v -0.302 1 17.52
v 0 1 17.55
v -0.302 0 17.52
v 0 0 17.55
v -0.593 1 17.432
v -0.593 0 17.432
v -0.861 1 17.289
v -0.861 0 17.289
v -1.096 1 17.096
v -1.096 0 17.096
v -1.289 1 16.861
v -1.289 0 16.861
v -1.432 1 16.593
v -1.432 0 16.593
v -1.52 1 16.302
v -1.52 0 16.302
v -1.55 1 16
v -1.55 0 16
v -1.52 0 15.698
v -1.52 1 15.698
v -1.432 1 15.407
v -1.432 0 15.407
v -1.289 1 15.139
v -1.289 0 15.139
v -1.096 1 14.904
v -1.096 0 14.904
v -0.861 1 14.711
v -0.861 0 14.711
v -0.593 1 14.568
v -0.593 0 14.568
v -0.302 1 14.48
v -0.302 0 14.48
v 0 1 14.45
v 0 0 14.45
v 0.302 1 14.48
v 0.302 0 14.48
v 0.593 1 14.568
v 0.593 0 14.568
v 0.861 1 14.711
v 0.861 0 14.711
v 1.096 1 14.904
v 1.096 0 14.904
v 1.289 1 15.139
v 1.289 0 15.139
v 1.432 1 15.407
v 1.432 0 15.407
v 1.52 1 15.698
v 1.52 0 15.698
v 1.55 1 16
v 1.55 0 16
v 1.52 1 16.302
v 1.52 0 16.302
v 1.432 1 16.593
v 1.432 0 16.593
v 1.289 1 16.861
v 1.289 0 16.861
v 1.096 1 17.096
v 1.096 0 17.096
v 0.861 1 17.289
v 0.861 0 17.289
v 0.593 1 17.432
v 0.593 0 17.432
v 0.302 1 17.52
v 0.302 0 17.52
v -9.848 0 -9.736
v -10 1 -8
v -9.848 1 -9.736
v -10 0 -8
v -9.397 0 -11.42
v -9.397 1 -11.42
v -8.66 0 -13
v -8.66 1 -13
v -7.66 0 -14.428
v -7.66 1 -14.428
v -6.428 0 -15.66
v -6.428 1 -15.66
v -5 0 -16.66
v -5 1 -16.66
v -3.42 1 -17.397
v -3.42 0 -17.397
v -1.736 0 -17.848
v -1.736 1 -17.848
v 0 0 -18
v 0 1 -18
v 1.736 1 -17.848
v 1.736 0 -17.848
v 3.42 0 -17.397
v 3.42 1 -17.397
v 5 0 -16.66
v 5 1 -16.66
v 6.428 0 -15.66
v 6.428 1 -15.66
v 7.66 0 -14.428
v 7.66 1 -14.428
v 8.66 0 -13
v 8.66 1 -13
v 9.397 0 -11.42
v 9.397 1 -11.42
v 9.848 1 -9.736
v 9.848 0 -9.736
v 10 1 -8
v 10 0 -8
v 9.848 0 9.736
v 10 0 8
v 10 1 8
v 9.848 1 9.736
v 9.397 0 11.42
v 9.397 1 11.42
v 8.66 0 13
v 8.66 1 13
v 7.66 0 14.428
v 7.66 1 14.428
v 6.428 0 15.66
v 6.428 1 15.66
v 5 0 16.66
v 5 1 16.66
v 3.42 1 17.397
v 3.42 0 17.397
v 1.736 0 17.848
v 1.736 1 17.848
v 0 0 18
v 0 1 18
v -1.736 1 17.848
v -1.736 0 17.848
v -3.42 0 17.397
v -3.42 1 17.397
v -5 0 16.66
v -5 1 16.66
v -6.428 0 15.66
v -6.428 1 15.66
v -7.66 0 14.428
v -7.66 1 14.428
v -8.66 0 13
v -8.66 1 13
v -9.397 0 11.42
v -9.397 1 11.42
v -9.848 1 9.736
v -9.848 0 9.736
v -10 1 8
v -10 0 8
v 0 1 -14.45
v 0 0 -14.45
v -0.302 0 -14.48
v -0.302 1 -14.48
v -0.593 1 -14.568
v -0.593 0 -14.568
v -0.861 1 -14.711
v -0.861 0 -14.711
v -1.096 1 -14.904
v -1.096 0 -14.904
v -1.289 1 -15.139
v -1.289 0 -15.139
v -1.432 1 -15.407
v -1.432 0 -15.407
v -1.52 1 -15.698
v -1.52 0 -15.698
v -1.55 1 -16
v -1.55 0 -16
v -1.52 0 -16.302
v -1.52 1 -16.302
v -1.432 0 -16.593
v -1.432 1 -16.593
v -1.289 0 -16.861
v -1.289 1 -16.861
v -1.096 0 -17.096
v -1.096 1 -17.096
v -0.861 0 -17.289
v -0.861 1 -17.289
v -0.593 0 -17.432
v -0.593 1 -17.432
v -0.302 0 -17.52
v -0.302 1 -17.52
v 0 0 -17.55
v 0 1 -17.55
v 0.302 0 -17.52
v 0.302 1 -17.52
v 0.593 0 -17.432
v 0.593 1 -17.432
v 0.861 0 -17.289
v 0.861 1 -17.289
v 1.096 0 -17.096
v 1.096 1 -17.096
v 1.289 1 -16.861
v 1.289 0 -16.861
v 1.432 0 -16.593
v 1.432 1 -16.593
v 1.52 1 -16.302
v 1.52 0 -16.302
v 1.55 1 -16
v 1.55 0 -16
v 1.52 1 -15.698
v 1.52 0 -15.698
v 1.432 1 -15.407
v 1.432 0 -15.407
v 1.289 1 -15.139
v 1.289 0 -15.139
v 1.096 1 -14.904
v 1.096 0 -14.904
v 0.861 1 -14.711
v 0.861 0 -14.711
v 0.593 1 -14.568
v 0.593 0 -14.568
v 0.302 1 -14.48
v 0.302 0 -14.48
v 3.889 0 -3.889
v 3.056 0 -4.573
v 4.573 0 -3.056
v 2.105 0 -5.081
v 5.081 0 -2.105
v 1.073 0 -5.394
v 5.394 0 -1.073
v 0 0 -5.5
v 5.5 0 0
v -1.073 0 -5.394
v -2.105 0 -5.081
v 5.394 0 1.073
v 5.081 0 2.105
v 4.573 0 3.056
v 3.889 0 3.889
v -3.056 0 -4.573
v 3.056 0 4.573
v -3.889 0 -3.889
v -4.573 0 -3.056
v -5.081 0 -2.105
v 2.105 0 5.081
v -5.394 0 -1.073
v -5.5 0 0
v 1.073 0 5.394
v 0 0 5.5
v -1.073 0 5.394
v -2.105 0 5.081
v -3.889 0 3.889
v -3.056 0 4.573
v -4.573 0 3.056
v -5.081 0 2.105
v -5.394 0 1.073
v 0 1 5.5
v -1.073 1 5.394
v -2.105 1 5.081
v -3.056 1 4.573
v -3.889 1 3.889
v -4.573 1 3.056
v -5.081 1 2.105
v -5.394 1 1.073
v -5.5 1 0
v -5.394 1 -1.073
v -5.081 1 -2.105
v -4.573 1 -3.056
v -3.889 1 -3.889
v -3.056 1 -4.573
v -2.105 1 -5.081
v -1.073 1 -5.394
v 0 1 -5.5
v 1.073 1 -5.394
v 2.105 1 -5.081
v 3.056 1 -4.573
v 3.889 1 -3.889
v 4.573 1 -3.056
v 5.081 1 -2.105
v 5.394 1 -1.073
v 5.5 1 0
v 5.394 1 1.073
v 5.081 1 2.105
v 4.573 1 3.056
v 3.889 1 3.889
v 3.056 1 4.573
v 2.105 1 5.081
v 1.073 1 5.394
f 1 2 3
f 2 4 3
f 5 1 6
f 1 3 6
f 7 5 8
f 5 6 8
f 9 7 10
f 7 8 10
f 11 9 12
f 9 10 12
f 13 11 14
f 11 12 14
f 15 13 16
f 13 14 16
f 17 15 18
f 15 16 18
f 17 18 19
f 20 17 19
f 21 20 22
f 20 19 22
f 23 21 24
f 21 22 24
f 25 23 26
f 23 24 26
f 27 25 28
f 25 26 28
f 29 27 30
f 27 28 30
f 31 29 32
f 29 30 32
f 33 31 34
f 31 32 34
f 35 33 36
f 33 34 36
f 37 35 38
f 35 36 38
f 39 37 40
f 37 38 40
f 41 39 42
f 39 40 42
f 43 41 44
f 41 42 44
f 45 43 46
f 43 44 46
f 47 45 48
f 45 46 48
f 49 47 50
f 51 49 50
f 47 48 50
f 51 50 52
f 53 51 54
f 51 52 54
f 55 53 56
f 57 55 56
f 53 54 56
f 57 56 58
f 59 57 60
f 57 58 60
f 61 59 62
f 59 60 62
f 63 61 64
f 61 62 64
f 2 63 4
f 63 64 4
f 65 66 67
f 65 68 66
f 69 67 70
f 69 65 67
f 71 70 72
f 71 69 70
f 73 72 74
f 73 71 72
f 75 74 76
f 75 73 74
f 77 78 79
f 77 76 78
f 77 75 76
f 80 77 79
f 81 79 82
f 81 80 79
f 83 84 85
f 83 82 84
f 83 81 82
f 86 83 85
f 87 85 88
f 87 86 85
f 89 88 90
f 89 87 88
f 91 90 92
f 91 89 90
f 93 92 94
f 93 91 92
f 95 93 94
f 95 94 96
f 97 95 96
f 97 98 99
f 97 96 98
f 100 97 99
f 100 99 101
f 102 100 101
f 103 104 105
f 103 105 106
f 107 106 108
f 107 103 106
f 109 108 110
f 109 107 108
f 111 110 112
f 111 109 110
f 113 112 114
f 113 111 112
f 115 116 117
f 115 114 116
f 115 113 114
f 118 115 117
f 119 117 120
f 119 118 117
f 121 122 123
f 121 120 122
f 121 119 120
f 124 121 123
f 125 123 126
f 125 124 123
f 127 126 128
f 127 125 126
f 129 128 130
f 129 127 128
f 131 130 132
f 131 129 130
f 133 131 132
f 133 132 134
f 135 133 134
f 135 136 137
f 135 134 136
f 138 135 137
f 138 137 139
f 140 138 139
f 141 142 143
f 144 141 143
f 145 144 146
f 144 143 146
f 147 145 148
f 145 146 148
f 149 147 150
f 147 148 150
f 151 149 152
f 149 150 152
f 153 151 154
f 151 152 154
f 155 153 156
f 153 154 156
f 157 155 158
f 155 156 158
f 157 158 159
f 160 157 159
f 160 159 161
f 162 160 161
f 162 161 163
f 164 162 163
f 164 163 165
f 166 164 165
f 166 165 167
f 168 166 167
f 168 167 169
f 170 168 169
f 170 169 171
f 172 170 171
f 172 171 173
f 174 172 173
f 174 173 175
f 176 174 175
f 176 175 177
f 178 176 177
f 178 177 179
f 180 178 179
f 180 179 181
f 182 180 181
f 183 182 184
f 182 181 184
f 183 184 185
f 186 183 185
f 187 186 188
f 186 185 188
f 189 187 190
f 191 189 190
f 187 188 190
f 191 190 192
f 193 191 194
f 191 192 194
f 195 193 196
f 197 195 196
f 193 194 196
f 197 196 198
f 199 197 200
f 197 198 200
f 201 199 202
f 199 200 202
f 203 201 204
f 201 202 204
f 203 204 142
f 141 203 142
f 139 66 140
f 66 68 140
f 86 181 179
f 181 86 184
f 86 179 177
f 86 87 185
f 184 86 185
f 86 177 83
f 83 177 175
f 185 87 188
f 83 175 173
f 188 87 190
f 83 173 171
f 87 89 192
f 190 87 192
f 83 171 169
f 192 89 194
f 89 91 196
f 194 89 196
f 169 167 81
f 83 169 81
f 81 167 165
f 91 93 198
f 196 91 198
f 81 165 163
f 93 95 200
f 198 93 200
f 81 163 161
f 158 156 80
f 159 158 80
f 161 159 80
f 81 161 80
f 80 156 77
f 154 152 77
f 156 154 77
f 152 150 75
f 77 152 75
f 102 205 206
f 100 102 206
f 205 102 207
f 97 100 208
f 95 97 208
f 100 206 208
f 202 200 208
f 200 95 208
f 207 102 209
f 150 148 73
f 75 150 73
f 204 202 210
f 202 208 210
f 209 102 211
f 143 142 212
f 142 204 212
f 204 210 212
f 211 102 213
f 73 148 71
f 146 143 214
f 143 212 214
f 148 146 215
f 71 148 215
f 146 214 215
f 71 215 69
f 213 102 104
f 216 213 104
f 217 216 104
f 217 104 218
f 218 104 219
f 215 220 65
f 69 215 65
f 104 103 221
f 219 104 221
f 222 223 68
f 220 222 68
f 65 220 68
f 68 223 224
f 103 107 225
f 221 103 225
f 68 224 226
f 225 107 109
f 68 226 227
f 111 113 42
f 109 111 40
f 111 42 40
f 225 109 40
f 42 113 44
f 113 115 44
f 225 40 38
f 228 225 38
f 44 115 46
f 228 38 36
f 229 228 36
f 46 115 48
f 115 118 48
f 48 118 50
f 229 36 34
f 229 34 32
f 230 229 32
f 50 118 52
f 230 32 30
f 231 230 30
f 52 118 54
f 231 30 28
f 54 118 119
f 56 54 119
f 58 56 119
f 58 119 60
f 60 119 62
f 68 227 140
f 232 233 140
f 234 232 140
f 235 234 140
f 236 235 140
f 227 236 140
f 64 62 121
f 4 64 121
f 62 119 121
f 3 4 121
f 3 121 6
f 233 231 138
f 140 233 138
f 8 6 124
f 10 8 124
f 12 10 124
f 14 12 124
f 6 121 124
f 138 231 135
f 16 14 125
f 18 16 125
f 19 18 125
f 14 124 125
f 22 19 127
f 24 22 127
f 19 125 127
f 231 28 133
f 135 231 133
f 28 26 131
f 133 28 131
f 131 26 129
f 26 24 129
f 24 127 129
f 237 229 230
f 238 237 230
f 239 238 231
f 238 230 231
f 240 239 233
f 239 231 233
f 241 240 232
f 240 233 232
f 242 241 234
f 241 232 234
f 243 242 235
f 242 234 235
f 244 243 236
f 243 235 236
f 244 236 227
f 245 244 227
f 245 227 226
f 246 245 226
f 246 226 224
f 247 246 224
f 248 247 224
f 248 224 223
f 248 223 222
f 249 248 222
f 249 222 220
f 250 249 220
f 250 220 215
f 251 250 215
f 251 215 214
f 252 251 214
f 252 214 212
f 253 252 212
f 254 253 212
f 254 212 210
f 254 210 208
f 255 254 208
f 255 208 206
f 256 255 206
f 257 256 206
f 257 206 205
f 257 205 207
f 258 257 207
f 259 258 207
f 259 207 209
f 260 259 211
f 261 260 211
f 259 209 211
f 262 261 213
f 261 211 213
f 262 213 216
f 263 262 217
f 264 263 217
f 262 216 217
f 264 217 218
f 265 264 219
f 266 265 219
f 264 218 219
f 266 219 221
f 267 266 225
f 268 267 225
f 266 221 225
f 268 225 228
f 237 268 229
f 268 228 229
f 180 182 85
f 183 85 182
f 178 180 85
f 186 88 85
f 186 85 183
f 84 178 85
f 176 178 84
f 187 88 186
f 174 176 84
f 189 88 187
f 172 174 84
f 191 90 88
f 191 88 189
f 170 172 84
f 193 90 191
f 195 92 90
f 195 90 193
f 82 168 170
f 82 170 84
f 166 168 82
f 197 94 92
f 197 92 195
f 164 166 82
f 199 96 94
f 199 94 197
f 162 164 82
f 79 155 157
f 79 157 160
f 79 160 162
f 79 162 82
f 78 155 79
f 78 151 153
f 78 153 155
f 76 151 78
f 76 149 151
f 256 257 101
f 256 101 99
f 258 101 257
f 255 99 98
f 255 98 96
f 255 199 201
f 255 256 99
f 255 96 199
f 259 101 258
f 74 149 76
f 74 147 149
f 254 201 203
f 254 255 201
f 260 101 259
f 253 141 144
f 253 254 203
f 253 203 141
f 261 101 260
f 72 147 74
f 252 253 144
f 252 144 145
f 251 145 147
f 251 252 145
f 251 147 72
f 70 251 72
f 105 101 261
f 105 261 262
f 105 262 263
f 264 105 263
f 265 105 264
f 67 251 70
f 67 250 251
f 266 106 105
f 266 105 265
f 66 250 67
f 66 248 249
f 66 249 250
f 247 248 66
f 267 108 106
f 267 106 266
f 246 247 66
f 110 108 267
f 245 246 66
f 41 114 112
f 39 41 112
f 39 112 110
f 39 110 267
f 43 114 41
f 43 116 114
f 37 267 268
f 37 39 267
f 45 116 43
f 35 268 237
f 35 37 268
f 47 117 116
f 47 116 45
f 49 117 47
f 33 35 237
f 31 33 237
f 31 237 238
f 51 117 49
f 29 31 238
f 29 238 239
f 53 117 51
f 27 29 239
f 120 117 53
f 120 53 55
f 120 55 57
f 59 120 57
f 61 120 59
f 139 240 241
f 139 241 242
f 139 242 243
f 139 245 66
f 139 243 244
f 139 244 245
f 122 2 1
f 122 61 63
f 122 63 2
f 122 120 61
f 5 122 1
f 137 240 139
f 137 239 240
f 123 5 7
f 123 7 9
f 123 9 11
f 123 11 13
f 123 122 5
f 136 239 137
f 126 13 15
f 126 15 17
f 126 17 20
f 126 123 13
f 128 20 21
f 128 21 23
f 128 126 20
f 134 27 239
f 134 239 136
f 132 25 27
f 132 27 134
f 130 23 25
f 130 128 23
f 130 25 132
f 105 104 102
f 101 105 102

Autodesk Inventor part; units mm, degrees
ref_plane "YZ Plane" through (0, 0, 0) normal (1, 0, 0) x (0, 1, 0)
ref_plane "XZ Plane" through (0, 0, 0) normal (0, 1, 0) x (-1, 0, 0)
ref_plane "XY Plane" through (0, 0, 0) normal (0, 0, 1) x (1, 0, 0)
sketch "Skizze1" plane through (0, 0, 0) normal (0, 1, 0) x (-1, 0, 0)
  line L0 (0, 8) -> (0, -8) construction
  line L1 (-10, 8) -> (-10, -8)
  line L2 (10, -8) -> (10, 8)
  arc A0 (10, 8) -> (-10, 8) centre (0, 8) ccw
  arc A1 (-10, -8) -> (10, -8) centre (0, -8) ccw
  point P0 (0, 0)
  point P1 (0, 0)
  dimension "d0" = 10
  dimension "d1" = 16
extrude "Extrusion1" add sketch "Skizze1" along normal blind 1
sketch "Skizze2" plane through (0, 1, 0) normal (0, 1, 0) x (1, 0, 0)
  point P0 (0, 0)
  point P1 (0, -16)
  point P2 (0, 16)
  dimension "d11" = 32
  dimension "d12" = 16
hole "Bohrung1" at (0, 1, 16) at (0, 1, -16) direction (0, -1, 0) diameter 3.1 depth 1
hole "Bohrung2" at (0, 1, 0) direction (0, -1, 0) diameter 11 depth 1
properties part number "Deckscheibe"
